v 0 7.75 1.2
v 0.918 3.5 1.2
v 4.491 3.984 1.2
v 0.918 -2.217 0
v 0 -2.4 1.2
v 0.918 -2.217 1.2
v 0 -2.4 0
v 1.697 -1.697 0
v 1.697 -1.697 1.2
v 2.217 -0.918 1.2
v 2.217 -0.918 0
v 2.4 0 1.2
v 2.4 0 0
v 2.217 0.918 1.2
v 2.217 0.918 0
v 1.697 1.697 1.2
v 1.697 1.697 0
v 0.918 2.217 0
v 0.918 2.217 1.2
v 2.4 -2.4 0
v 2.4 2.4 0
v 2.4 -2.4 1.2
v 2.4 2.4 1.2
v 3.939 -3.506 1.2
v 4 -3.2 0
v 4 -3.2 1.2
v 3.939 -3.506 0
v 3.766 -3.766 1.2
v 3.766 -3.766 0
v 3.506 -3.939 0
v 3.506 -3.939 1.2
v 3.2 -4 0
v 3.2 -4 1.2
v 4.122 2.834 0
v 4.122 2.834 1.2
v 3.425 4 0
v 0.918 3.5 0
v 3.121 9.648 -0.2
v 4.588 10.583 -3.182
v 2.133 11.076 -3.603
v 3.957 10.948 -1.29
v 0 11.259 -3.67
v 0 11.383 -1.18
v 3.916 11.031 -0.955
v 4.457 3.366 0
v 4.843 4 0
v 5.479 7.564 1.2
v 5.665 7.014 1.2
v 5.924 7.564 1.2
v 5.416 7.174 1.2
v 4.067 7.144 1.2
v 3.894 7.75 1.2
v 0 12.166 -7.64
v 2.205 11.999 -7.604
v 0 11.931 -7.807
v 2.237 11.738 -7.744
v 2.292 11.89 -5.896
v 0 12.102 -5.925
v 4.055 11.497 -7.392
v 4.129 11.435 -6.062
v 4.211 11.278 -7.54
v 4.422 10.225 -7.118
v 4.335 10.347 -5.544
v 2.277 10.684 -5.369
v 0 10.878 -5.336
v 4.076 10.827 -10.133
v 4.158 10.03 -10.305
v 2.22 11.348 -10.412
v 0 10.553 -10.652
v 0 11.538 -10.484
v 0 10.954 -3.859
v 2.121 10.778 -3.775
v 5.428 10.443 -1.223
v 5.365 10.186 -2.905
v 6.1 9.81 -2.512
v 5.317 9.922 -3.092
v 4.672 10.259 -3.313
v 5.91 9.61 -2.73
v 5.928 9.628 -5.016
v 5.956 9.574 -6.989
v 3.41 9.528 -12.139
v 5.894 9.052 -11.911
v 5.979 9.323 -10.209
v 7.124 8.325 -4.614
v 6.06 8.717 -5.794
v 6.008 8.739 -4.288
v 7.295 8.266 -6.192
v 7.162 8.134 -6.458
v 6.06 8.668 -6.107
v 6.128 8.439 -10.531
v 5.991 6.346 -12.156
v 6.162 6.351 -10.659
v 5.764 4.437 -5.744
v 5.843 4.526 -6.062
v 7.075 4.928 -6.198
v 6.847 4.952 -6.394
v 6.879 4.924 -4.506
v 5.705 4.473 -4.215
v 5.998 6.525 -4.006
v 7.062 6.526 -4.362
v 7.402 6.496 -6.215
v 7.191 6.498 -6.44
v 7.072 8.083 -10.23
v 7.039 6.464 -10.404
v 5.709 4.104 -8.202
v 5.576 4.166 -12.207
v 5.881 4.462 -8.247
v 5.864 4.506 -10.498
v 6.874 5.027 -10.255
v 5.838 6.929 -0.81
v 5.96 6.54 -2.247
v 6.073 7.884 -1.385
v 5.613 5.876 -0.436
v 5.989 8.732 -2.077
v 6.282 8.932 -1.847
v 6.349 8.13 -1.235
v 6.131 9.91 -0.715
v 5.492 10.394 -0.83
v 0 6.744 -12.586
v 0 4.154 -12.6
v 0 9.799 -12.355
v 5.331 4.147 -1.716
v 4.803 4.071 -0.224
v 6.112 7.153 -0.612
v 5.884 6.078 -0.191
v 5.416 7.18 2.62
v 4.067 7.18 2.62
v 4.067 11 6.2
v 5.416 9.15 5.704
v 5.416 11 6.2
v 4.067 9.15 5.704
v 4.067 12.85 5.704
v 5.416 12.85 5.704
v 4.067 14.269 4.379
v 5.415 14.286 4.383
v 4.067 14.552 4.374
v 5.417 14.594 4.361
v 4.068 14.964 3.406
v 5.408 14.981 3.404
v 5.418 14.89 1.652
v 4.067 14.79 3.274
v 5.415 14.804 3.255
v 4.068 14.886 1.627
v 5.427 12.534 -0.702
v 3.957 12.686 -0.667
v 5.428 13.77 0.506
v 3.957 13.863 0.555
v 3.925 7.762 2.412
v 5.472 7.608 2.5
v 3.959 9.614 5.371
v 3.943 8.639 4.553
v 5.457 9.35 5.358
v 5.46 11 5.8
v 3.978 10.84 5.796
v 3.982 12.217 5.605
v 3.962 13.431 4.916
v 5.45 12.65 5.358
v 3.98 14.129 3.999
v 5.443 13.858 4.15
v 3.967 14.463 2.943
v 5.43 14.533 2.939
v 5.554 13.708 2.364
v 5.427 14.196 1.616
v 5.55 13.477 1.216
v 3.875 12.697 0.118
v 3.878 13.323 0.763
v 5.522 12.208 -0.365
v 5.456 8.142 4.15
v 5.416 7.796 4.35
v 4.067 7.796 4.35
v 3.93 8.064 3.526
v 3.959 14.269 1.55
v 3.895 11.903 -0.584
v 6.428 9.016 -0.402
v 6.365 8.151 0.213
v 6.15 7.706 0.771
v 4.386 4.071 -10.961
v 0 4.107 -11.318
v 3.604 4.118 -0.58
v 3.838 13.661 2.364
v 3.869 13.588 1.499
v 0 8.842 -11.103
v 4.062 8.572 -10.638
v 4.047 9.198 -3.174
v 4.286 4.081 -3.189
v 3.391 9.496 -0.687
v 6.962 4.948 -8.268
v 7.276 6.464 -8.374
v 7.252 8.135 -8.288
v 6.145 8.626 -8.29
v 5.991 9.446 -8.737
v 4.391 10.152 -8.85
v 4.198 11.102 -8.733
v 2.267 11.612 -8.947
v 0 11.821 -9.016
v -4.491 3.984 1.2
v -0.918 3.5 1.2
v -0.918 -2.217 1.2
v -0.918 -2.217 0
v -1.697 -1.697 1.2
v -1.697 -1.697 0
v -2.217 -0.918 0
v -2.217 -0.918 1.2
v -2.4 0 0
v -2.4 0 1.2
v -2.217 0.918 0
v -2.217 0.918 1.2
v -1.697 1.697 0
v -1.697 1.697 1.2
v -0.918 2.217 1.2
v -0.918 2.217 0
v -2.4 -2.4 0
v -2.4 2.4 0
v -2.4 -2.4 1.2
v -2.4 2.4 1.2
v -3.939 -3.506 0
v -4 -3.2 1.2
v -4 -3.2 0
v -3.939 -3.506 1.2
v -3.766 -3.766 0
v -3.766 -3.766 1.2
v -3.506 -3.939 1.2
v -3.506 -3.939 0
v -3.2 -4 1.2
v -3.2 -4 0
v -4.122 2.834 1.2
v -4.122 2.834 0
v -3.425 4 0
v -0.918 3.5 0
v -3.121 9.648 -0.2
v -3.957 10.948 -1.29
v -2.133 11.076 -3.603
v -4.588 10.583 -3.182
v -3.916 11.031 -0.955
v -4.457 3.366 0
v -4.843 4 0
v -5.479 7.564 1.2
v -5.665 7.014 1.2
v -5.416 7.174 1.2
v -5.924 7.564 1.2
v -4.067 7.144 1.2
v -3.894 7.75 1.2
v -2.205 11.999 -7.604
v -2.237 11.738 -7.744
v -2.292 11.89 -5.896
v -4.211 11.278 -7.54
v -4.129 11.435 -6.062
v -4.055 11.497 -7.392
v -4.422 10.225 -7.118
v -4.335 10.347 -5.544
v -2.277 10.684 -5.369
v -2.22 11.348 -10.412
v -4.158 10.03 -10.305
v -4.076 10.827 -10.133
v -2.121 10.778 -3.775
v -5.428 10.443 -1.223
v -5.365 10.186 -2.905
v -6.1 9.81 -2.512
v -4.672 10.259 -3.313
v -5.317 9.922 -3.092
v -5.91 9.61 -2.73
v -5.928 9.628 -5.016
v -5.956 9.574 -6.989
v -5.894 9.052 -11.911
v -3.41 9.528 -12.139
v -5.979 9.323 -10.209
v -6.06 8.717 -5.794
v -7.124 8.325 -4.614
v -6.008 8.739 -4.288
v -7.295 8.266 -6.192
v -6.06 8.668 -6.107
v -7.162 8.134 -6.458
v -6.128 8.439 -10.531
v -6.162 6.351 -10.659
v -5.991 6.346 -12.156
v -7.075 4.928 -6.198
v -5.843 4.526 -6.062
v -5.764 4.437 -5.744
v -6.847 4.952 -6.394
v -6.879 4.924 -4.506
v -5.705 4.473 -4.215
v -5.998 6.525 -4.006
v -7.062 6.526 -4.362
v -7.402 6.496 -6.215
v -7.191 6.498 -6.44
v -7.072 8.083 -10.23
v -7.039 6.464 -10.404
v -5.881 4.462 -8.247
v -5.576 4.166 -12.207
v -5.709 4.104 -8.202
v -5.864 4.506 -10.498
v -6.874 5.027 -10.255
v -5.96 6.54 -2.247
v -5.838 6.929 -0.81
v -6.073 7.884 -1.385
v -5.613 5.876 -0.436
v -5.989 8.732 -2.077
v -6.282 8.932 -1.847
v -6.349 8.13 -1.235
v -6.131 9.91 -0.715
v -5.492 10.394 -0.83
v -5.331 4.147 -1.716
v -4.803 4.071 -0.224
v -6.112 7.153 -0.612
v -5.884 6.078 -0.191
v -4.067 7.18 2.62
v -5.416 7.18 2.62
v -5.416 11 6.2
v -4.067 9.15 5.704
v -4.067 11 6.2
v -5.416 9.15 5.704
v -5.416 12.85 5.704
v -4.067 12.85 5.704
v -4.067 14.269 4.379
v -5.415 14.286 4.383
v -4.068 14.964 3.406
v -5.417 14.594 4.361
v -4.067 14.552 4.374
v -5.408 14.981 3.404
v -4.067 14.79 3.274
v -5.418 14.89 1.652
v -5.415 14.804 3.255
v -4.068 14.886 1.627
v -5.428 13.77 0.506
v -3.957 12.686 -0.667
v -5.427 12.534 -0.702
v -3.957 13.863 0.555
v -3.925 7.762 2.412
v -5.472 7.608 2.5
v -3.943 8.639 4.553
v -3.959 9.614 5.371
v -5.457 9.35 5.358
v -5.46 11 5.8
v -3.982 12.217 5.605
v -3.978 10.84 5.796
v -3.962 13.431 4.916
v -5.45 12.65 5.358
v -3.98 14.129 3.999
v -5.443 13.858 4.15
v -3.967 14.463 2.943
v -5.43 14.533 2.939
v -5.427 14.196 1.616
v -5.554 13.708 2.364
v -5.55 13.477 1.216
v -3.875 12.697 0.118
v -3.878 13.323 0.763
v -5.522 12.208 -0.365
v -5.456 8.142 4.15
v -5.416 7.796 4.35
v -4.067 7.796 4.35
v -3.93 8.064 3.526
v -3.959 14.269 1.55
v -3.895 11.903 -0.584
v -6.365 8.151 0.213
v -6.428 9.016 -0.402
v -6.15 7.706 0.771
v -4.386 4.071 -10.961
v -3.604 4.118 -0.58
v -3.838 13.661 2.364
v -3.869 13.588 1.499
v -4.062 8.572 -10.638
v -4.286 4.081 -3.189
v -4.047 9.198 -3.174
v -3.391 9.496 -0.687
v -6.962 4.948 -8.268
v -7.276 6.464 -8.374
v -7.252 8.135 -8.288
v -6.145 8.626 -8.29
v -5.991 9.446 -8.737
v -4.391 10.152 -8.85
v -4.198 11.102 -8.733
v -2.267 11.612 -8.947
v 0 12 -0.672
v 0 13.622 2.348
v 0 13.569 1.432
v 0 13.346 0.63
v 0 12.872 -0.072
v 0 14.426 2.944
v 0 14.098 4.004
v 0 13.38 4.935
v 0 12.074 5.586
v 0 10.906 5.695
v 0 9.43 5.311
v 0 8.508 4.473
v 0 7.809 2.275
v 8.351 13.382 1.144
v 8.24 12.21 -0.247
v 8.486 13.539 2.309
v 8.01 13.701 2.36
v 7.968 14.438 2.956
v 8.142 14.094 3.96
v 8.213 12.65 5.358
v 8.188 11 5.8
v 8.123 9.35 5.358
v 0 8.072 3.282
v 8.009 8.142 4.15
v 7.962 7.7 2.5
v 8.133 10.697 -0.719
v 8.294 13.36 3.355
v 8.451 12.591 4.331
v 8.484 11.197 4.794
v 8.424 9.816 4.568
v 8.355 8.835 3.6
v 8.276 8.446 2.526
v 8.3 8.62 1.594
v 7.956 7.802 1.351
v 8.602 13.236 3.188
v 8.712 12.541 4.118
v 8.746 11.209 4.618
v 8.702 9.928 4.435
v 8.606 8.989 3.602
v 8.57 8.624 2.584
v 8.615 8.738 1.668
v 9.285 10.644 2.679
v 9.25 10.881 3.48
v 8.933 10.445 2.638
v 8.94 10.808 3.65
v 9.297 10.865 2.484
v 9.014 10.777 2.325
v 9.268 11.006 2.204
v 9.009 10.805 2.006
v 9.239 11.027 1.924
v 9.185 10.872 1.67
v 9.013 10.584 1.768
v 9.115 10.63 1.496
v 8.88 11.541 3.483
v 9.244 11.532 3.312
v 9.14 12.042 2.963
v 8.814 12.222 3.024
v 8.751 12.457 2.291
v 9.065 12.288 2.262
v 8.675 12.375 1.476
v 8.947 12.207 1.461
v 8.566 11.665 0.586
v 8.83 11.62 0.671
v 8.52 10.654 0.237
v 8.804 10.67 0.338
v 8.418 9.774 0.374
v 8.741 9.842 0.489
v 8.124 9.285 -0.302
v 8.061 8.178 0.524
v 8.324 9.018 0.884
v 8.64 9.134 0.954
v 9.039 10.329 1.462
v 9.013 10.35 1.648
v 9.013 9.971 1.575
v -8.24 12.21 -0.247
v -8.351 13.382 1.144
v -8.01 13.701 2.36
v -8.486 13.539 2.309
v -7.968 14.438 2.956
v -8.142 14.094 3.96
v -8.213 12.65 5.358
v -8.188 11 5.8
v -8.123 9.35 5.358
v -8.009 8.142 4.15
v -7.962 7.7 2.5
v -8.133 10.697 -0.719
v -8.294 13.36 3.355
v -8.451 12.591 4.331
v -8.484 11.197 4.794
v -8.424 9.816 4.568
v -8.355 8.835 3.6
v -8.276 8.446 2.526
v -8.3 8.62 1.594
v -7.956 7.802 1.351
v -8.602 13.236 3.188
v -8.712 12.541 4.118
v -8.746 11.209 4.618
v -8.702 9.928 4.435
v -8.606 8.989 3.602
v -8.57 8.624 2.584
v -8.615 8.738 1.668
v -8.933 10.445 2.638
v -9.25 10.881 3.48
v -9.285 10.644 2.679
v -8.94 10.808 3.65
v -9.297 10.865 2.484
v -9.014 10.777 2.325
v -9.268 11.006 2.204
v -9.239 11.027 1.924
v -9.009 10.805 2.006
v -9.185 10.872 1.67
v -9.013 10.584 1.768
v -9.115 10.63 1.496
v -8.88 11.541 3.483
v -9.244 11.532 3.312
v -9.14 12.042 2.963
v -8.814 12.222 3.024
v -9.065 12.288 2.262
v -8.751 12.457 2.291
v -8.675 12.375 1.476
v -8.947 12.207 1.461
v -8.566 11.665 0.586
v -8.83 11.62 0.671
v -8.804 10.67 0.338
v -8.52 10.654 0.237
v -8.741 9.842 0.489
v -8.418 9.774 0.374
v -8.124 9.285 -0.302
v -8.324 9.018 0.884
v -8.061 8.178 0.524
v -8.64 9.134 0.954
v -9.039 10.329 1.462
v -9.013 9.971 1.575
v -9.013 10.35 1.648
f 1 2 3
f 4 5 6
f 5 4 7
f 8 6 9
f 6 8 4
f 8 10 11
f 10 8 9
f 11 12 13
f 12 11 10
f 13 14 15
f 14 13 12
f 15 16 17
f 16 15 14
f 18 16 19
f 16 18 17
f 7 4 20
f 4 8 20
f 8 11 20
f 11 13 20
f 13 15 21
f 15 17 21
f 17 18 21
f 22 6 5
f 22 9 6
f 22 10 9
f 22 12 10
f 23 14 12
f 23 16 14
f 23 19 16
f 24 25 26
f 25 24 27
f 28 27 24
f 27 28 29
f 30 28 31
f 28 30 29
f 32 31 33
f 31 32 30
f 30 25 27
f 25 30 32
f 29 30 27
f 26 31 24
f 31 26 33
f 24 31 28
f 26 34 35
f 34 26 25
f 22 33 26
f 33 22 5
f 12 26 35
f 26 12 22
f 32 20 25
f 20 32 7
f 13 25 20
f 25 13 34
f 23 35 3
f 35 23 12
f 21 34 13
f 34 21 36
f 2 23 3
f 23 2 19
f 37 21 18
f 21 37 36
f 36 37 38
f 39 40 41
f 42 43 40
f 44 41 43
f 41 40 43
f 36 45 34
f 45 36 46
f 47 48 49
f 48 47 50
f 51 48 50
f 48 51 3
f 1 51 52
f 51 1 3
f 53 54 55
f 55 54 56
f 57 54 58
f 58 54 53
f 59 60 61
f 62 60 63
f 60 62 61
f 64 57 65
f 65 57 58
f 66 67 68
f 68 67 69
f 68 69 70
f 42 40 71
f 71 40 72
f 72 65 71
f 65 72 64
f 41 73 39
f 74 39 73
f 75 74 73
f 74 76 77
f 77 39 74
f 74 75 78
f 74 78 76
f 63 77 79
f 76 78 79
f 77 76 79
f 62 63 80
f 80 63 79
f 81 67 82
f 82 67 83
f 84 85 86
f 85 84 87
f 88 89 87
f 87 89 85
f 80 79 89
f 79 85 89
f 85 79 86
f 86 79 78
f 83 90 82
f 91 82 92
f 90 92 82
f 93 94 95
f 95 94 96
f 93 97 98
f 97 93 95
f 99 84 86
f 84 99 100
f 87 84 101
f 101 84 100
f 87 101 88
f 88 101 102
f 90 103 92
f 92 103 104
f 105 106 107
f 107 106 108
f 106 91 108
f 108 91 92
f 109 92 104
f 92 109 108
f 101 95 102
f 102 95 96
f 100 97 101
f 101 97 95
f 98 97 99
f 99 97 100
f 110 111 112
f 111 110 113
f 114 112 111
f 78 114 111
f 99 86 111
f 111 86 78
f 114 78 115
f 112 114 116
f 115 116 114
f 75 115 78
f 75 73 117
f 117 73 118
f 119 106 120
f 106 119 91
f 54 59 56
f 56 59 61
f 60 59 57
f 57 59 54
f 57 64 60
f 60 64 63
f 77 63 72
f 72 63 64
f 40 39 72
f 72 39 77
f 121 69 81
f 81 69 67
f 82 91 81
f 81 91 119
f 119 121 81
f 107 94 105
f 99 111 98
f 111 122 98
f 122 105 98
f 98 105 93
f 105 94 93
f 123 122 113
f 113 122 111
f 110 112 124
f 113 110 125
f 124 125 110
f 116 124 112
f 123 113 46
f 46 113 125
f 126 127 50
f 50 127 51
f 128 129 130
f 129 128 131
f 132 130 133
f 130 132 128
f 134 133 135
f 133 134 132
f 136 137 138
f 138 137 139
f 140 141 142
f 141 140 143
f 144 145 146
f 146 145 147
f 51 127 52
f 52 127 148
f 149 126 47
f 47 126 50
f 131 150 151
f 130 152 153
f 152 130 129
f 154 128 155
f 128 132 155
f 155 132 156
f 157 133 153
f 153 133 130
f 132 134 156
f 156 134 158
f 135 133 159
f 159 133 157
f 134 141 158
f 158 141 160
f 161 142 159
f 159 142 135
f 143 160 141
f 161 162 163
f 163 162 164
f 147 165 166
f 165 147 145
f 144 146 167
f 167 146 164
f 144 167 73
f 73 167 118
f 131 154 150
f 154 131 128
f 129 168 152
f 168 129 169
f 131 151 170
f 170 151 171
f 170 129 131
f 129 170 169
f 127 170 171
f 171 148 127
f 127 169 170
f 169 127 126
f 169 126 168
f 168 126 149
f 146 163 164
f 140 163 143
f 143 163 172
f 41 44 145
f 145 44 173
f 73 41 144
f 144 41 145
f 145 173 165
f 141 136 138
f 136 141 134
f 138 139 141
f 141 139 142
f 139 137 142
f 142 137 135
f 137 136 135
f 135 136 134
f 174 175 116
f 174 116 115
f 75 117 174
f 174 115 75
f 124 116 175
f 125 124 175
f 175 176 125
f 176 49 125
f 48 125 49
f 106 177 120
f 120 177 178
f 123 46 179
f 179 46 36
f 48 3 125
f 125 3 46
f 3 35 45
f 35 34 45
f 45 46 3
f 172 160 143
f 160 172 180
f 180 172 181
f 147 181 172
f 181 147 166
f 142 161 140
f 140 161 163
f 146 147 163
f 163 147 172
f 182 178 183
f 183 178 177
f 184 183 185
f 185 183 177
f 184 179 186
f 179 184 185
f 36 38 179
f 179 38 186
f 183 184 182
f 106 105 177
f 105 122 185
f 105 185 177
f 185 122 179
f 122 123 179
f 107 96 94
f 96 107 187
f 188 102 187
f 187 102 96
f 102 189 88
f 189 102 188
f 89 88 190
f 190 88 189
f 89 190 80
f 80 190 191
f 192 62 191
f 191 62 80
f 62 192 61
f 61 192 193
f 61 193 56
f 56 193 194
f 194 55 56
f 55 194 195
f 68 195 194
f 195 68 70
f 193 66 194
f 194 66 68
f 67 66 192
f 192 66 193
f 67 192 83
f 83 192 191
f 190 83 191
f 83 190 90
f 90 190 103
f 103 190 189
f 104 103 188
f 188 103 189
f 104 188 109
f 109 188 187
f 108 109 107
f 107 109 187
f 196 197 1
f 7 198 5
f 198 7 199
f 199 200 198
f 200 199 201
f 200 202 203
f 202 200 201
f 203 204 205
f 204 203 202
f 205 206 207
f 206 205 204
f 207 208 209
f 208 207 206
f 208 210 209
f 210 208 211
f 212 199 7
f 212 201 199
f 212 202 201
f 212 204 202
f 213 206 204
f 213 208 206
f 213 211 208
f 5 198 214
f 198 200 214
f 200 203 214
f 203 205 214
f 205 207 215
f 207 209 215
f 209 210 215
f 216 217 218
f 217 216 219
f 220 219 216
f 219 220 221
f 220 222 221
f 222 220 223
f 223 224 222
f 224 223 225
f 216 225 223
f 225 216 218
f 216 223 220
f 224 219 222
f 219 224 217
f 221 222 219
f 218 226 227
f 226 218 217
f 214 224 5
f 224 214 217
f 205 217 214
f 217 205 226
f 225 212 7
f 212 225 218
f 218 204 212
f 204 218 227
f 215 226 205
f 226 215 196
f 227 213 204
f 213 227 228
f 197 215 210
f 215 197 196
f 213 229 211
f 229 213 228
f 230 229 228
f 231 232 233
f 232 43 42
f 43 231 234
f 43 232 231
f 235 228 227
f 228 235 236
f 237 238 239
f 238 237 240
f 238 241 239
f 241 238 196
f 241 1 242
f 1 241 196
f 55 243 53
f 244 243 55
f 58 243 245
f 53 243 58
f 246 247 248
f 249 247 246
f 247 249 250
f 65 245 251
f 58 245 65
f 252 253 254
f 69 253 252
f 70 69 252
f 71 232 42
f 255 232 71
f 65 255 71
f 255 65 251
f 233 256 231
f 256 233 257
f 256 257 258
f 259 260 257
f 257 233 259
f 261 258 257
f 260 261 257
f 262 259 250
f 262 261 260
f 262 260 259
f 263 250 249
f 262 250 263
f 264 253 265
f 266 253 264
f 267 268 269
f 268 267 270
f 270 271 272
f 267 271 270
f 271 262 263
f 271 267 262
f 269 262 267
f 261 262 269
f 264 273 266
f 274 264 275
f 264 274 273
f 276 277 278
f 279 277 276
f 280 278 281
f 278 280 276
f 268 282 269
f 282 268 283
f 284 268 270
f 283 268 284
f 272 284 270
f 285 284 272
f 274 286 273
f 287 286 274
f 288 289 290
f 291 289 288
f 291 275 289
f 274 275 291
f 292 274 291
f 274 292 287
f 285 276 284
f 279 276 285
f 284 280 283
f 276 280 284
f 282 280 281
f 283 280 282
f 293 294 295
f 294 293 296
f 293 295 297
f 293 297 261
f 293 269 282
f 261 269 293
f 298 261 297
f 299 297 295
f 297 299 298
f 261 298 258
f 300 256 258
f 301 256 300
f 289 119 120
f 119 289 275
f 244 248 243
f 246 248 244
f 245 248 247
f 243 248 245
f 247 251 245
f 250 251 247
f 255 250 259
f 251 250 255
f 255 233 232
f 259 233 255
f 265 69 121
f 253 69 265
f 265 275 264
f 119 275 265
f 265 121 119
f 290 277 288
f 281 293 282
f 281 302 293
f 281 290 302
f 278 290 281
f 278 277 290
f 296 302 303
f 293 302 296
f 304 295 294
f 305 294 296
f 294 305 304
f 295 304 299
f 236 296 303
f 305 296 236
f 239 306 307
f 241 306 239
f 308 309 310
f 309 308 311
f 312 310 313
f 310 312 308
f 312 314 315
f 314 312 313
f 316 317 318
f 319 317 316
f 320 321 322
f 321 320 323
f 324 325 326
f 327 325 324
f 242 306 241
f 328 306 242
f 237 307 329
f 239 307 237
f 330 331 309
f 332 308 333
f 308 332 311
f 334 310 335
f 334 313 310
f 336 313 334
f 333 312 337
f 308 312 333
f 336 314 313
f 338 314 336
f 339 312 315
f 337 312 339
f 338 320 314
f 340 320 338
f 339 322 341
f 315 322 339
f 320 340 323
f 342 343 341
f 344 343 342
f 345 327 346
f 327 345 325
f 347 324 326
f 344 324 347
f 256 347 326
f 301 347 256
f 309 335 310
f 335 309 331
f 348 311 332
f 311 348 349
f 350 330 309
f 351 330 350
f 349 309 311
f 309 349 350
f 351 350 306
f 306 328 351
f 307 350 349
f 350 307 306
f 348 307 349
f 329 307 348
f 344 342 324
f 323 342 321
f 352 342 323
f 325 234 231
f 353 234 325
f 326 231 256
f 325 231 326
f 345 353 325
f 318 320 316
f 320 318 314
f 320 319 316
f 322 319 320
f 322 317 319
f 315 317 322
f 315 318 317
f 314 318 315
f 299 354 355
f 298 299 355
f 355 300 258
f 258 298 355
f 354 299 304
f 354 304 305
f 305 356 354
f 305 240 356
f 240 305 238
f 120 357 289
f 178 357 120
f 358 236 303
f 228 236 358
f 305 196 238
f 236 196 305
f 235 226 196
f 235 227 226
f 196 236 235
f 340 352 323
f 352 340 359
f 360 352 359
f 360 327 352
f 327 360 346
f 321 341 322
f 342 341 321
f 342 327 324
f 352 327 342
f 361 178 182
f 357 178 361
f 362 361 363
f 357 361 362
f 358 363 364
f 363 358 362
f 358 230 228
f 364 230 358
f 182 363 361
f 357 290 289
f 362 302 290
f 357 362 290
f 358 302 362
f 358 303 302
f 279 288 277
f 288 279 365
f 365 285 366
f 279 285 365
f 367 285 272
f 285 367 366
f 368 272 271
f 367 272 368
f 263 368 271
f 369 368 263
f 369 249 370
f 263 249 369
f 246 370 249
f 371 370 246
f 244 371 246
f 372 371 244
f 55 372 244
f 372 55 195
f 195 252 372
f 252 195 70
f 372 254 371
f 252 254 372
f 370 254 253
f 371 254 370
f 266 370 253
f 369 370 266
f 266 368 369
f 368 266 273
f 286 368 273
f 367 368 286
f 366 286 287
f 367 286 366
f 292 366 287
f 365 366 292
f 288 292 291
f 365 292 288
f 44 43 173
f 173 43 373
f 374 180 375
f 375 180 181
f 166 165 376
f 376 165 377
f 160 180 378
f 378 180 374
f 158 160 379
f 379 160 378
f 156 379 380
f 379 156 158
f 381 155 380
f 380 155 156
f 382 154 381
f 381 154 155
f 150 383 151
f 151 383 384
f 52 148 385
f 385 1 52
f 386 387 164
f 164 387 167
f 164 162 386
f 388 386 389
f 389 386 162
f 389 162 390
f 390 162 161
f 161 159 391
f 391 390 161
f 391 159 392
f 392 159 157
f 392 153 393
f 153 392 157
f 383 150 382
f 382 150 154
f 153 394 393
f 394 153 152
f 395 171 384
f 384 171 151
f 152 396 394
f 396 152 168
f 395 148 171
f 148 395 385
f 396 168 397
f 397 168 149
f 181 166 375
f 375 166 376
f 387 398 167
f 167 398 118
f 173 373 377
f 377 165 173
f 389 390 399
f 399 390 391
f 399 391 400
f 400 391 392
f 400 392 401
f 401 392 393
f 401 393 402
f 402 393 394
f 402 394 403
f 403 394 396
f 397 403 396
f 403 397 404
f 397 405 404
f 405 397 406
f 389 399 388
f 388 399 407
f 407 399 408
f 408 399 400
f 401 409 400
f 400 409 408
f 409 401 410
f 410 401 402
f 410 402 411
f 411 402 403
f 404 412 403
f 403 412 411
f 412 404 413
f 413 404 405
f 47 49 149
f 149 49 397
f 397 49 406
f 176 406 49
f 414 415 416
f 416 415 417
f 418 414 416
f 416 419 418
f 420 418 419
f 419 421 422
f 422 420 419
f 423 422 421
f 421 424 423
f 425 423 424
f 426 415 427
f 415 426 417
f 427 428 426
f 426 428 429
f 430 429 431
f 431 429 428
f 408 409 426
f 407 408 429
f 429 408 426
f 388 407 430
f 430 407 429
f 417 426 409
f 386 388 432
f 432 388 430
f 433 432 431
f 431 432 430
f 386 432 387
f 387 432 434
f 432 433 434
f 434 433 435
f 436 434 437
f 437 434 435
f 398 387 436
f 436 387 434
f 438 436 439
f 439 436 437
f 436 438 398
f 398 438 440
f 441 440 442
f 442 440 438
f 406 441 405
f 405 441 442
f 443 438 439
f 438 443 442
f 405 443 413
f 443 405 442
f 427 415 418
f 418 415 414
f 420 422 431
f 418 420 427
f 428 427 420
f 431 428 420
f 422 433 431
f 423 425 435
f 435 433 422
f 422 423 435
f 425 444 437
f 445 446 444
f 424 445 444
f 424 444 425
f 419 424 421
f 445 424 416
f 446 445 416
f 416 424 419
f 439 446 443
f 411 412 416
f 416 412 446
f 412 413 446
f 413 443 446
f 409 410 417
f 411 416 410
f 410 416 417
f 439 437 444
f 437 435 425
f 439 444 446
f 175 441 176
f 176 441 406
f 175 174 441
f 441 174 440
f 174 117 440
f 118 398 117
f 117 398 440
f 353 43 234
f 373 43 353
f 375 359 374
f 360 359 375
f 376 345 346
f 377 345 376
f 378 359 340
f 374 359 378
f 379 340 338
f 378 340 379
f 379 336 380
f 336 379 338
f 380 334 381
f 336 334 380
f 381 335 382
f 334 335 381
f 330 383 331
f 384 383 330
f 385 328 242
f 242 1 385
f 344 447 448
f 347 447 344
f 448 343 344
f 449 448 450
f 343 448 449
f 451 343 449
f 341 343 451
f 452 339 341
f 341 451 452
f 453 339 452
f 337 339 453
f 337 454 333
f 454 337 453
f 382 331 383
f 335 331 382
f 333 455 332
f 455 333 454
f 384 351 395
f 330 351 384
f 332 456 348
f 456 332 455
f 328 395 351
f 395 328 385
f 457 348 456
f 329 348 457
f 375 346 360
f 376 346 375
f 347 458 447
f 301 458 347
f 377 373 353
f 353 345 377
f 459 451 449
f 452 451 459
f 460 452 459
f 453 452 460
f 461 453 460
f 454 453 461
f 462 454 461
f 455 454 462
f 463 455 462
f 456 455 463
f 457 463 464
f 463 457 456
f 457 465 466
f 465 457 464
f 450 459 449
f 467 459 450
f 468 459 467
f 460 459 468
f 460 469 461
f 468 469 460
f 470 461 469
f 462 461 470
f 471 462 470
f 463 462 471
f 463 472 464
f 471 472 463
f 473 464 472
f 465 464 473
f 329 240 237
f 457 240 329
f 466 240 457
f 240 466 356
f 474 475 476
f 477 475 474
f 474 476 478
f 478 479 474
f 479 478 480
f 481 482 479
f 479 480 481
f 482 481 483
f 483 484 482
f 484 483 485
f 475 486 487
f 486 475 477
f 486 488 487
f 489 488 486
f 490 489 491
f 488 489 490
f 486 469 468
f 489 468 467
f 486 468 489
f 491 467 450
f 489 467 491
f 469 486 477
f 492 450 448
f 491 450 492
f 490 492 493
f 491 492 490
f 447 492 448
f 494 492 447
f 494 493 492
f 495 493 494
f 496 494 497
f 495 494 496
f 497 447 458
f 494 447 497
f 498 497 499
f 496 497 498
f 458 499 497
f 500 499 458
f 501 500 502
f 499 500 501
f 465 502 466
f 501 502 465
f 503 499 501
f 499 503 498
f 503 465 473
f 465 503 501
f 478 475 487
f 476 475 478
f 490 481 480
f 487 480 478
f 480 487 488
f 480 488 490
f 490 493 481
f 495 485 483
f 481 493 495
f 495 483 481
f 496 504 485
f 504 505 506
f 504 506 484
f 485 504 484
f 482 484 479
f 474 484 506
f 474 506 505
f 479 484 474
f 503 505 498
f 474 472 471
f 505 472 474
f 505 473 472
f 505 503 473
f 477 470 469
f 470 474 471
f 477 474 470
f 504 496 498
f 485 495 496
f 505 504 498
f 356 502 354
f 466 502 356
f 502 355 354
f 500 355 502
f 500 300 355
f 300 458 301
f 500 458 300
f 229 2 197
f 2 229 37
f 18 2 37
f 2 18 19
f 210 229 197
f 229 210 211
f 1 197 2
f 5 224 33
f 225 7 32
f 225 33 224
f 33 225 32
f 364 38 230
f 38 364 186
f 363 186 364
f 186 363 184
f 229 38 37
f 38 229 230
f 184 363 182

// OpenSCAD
use <../lib.scad>
use <../p/box3u2p.scad>
use <../p/rect2p.scad>
use <s/26073s01.scad>
use <s/26073s02.scad>
function ldraw_lib__26073p05() = [
// 0 Minifig Backpack with Three Pouches and Medium Azure Bedroll Pattern
// 0 Name: 26073p05.dat
// 0 Author: Vincent Messenet [Cheenzo]
// 0 !LDRAW_ORG Part UPDATE 2024-07
// 0 !LICENSE Licensed under CC BY 4.0 : see CAreadme.txt
// 
// 0 BFC CERTIFY CCW
  [0,"BFC","CERTIFY"],
  [0,"BFC","CCW"],
// 
// 0 !CATEGORY Minifig Neckwear
// 0 !KEYWORDS Bricklink 26073pb05, Rebrickable 26073pr0005, Set 60376
// 
// 0 !HISTORY 2024-08-26 [OrionP] Official Update 2024-07
// 
// 1 16 0 0 0 1 0 0 0 1 0 0 0 1 s\26073s01.dat
  [1,16,0,0,0,1,0,0,0,1,0,0,0,1, ldraw_lib__s__26073s01()],
// 1 16 0 0 0 -1 0 0 0 1 0 0 0 1 s\26073s01.dat
  [1,16,0,0,0,-1,0,0,0,1,0,0,0,1, ldraw_lib__s__26073s01()],
// 1 322 0 0 0 1 0 0 0 1 0 0 0 1 s\26073s02.dat
  [1,322,0,0,0,1,0,0,0,1,0,0,0,1, ldraw_lib__s__26073s02()],
// 1 322 0 0 0 -1 0 0 0 1 0 0 0 1 s\26073s02.dat
  [1,322,0,0,0,-1,0,0,0,1,0,0,0,1, ldraw_lib__s__26073s02()],
// 
// 0 BFC INVERTNEXT
  [0,"BFC","INVERTNEXT"],
// 1 16 0 -1.5 5.5434 0 0 2.2962 1.5 0 0 0 3.2066 0 box3u2p.dat
  [1,16,0,-1.5,5.5434,0,0,2.2962,1.5,0,0,0,3.2066,0, ldraw_lib__box3u2p()],
// 3 16 0 -3 19.374 -2.2962 -3 8.75 2.2962 -3 8.75
  [3,16,0,-3,19.374,-2.2962,-3,8.75,2.2962,-3,8.75],
// 3 16 0 -3 -6 -8 -3 -10 8 -3 -10
  [3,16,0,-3,-6,-8,-3,-10,8,-3,-10],
// 3 16 -8 0 -10 0 0 -6 8 0 -10
  [3,16,-8,0,-10,0,0,-6,8,0,-10],
// 1 16 0 -1.5 -10 -8 0 0 0 0 1.5 0 1 0 rect2p.dat
  [1,16,0,-1.5,-10,-8,0,0,0,0,1.5,0,1,0, ldraw_lib__rect2p()],
// 2 24 7.802 .499 24.119 -7.802 .499 24.119
  [2,24,7.802,.499,24.119,-7.802,.499,24.119],
// 
// 4 16 7.802 .499 24.119 -7.802 .499 24.119 -8.477 1.717 23.739 8.477 1.717 23.739
  [4,16,7.802,.499,24.119,-7.802,.499,24.119,-8.477,1.717,23.739,8.477,1.717,23.739],
// 4 16 10.117 7.934 22.995 8.477 1.717 23.739 -8.477 1.717 23.739 -10.117 7.934 22.995
  [4,16,10.117,7.934,22.995,8.477,1.717,23.739,-8.477,1.717,23.739,-10.117,7.934,22.995],
// 4 16 2.2962 0 8.75 -2.2962 0 8.75 -7.802 .499 24.119 7.802 .499 24.119
  [4,16,2.2962,0,8.75,-2.2962,0,8.75,-7.802,.499,24.119,7.802,.499,24.119],
// 3 16 10.117 7.934 22.995 -10.117 7.934 22.995 0 27.758 22.106
  [3,16,10.117,7.934,22.995,-10.117,7.934,22.995,0,27.758,22.106],
// 5 24 8.477 1.717 23.739 -8.477 1.717 23.739 7.802 .499 24.119 10.117 7.934 22.995
  [5,24,8.477,1.717,23.739,-8.477,1.717,23.739,7.802,.499,24.119,10.117,7.934,22.995],
// 5 24 -10.117 7.934 22.995 10.117 7.934 22.995 8.477 1.717 23.739 10.156 26.595 21.431
  [5,24,-10.117,7.934,22.995,10.117,7.934,22.995,8.477,1.717,23.739,10.156,26.595,21.431],
// 5 24 10.117 7.934 22.995 0 27.758 22.106 10.156 26.595 21.431 -10.117 7.934 22.995
  [5,24,10.117,7.934,22.995,0,27.758,22.106,10.156,26.595,21.431,-10.117,7.934,22.995],
// 5 24 0 27.758 22.106 -10.117 7.934 22.995 10.117 7.934 22.995 -10.156 26.595 21.431
  [5,24,0,27.758,22.106,-10.117,7.934,22.995,10.117,7.934,22.995,-10.156,26.595,21.431],
// 
// 0 // Seam
// 5 24 0 31.466 16.86 0 31.501 10.384 -14.977 30.389 15.864 13.94 30.517 10.414
  [5,24,0,31.466,16.86,0,31.501,10.384,-14.977,30.389,15.864,13.94,30.517,10.414],
// 5 24 0 30.888 24.497 0 31.466 16.86 8.525 30.348 23.819 -8.525 30.348 23.819
  [5,24,0,30.888,24.497,0,31.466,16.86,8.525,30.348,23.819,-8.525,30.348,23.819],
// 5 24 0 26.629 26.383 0 30.888 24.497 8.525 30.348 23.819 -8.525 30.348 23.819
  [5,24,0,26.629,26.383,0,30.888,24.497,8.525,30.348,23.819,-8.525,30.348,23.819],
// 5 24 0 26.629 26.383 0 26.211 28.844 5.549 26.03 28.371 -5.549 26.03 28.371
  [5,24,0,26.629,26.383,0,26.211,28.844,5.549,26.03,28.371,-5.549,26.03,28.371],
// 5 24 0 22.541 29.553 0 26.211 28.844 -5.667 22.367 29.03 5.549 26.03 28.371
  [5,24,0,22.541,29.553,0,26.211,28.844,-5.667,22.367,29.03,5.549,26.03,28.371],
// 5 24 0 22.541 29.553 0 19.518 29.827 -5.667 22.367 29.03 5.592 19.361 29.344
  [5,24,0,22.541,29.553,0,19.518,29.827,-5.667,22.367,29.03,5.592,19.361,29.344],
// 5 24 0 19.518 29.827 0 19.101 30.416 -5.512 19.01 29.997 5.512 19.01 29.997
  [5,24,0,19.518,29.827,0,19.101,30.416,-5.512,19.01,29.997,5.512,19.01,29.997],
// 5 24 0 14.812 30.254 0 19.101 30.416 5.512 19.01 29.997 -5.512 19.01 29.997
  [5,24,0,14.812,30.254,0,19.101,30.416,5.512,19.01,29.997,-5.512,19.01,29.997],
// 5 24 0 13.34 27.194 0 14.812 30.254 5.731 14.739 29.726 -5.731 14.739 29.726
  [5,24,0,13.34,27.194,0,14.812,30.254,5.731,14.739,29.726,-5.731,14.739,29.726],
// 5 24 0 13.34 27.194 0 9.647 27.386 5.303 9.437 26.946 -5.693 13.422 26.709
  [5,24,0,13.34,27.194,0,9.647,27.386,5.303,9.437,26.946,-5.693,13.422,26.709],
// 5 24 0 9.647 27.386 0 9.174 28.147 5.332 9.008 27.69 -5.332 9.008 27.69
  [5,24,0,9.647,27.386,0,9.174,28.147,5.332,9.008,27.69,-5.332,9.008,27.69],
// 5 24 0 9.174 28.147 0 2.95 28.458 -5.332 9.008 27.69 5.332 9.008 27.69
  [5,24,0,9.174,28.147,0,2.95,28.458,-5.332,9.008,27.69,5.332,9.008,27.69],
// 5 24 0 1.68 29.999 0 2.95 28.458 -9.738 1.231 29.578 9.738 1.231 29.578
  [5,24,0,1.68,29.999,0,2.95,28.458,-9.738,1.231,29.578,9.738,1.231,29.578],
// 5 24 0 .179 32.18 0 1.68 29.999 9.687 -.296 31.742 -9.738 1.231 29.578
  [5,24,0,.179,32.18,0,1.68,29.999,9.687,-.296,31.742,-9.738,1.231,29.578],
// 5 24 0 -1.576 33.365 0 .179 32.18 9.687 -.296 31.742 -9.687 -.296 31.742
  [5,24,0,-1.576,33.365,0,.179,32.18,9.687,-.296,31.742,-9.687,-.296,31.742],
// 5 24 0 -3.579 33.922 0 -1.576 33.365 9.696 -1.907 33.307 -9.696 -1.907 33.307
  [5,24,0,-3.579,33.922,0,-1.576,33.365,9.696,-1.907,33.307,-9.696,-1.907,33.307],
// 5 24 0 -3.579 33.922 0 -5.871 34.055 9.594 -5.911 34.153 -9.594 -5.911 34.153
  [5,24,0,-3.579,33.922,0,-5.871,34.055,9.594,-5.911,34.153,-9.594,-5.911,34.153],
// 5 24 0 -5.871 34.055 0 -7.36 36.065 9.594 -5.911 34.153 -9.594 -5.911 34.153
  [5,24,0,-5.871,34.055,0,-7.36,36.065,9.594,-5.911,34.153,-9.594,-5.911,34.153],
// 5 24 0 -10.009 35.245 0 -7.36 36.065 9.918 -7.358 36.157 -9.918 -7.358 36.157
  [5,24,0,-10.009,35.245,0,-7.36,36.065,9.918,-7.358,36.157,-9.918,-7.358,36.157],
// 5 24 0 -12.337 33.451 0 -10.009 35.245 9.904 -12.291 33.578 -9.95 -9.997 35.323
  [5,24,0,-12.337,33.451,0,-10.009,35.245,9.904,-12.291,33.578,-9.95,-9.997,35.323],
// 5 24 0 -13.966 30.184 0 -12.337 33.451 9.956 -14.012 30.543 -9.956 -14.012 30.543
  [5,24,0,-13.966,30.184,0,-12.337,33.451,9.956,-14.012,30.543,-9.956,-14.012,30.543],
// 5 24 0 -14.238 27.264 0 -13.966 30.184 -9.946 -14.489 27.1 9.946 -14.489 27.1
  [5,24,0,-14.238,27.264,0,-13.966,30.184,-9.946,-14.489,27.1,9.946,-14.489,27.1],
// 5 24 0 -5.688 19.523 0 -3 19.374 -9.812 -6.029 19.404 9.735 -3 19.374
  [5,24,0,-5.688,19.523,0,-3,19.374,-9.812,-6.029,19.404,9.735,-3,19.374],
// 5 24 0 -5.688 19.523 0 -8.205 20.18 -9.825 -8.814 20.16 9.812 -6.029 19.404
  [5,24,0,-5.688,19.523,0,-8.205,20.18,-9.825,-8.814,20.16,9.812,-6.029,19.404],
// 5 24 0 -8.205 20.18 0 -11.183 21.269 -9.825 -8.814 20.16 9.825 -8.814 20.16
  [5,24,0,-8.205,20.18,0,-11.183,21.269,-9.825,-8.814,20.16,9.825,-8.814,20.16],
// 5 24 0 -11.183 21.269 0 -13.278 23.574 -9.857 -11.382 21.598 9.857 -11.382 21.598
  [5,24,0,-11.183,21.269,0,-13.278,23.574,-9.857,-11.382,21.598,9.857,-11.382,21.598],
// 5 24 0 -13.278 23.574 0 -14.238 27.264 9.897 -13.428 24.034 -9.897 -13.428 24.034
  [5,24,0,-13.278,23.574,0,-14.238,27.264,9.897,-13.428,24.034,-9.897,-13.428,24.034],
// 5 24 0 28.295 10.267 0 31.501 10.384 10.966 27.403 10.178 -10.966 27.403 10.178
  [5,24,0,28.295,10.267,0,31.501,10.384,10.966,27.403,10.178,-10.966,27.403,10.178],
// 5 24 0 27.758 22.106 0 28.295 10.267 -10.156 26.595 21.431 10.156 26.595 21.431
  [5,24,0,27.758,22.106,0,28.295,10.267,-10.156,26.595,21.431,10.156,26.595,21.431],
// 
// 5 24 -7.802 .499 24.119 -2.2962 0 8.75 -8.563 0 10 7.802 .499 24.119
  [5,24,-7.802,.499,24.119,-2.2962,0,8.75,-8.563,0,10,7.802,.499,24.119],
// 5 24 7.802 .499 24.119 2.2962 0 8.75 -7.802 .499 24.119 8.563 0 10
  [5,24,7.802,.499,24.119,2.2962,0,8.75,-7.802,.499,24.119,8.563,0,10],
];
module ldraw_lib__26073p05(step=0, col=false, unit=2/5, alt=false, line=0.2, solid=!$preview)
    makepoly(ldraw_lib__26073p05(), step=step, col=col, unit=unit, alt=alt, line=line, solid=solid);
ldraw_lib__26073p05(line=0.2);
